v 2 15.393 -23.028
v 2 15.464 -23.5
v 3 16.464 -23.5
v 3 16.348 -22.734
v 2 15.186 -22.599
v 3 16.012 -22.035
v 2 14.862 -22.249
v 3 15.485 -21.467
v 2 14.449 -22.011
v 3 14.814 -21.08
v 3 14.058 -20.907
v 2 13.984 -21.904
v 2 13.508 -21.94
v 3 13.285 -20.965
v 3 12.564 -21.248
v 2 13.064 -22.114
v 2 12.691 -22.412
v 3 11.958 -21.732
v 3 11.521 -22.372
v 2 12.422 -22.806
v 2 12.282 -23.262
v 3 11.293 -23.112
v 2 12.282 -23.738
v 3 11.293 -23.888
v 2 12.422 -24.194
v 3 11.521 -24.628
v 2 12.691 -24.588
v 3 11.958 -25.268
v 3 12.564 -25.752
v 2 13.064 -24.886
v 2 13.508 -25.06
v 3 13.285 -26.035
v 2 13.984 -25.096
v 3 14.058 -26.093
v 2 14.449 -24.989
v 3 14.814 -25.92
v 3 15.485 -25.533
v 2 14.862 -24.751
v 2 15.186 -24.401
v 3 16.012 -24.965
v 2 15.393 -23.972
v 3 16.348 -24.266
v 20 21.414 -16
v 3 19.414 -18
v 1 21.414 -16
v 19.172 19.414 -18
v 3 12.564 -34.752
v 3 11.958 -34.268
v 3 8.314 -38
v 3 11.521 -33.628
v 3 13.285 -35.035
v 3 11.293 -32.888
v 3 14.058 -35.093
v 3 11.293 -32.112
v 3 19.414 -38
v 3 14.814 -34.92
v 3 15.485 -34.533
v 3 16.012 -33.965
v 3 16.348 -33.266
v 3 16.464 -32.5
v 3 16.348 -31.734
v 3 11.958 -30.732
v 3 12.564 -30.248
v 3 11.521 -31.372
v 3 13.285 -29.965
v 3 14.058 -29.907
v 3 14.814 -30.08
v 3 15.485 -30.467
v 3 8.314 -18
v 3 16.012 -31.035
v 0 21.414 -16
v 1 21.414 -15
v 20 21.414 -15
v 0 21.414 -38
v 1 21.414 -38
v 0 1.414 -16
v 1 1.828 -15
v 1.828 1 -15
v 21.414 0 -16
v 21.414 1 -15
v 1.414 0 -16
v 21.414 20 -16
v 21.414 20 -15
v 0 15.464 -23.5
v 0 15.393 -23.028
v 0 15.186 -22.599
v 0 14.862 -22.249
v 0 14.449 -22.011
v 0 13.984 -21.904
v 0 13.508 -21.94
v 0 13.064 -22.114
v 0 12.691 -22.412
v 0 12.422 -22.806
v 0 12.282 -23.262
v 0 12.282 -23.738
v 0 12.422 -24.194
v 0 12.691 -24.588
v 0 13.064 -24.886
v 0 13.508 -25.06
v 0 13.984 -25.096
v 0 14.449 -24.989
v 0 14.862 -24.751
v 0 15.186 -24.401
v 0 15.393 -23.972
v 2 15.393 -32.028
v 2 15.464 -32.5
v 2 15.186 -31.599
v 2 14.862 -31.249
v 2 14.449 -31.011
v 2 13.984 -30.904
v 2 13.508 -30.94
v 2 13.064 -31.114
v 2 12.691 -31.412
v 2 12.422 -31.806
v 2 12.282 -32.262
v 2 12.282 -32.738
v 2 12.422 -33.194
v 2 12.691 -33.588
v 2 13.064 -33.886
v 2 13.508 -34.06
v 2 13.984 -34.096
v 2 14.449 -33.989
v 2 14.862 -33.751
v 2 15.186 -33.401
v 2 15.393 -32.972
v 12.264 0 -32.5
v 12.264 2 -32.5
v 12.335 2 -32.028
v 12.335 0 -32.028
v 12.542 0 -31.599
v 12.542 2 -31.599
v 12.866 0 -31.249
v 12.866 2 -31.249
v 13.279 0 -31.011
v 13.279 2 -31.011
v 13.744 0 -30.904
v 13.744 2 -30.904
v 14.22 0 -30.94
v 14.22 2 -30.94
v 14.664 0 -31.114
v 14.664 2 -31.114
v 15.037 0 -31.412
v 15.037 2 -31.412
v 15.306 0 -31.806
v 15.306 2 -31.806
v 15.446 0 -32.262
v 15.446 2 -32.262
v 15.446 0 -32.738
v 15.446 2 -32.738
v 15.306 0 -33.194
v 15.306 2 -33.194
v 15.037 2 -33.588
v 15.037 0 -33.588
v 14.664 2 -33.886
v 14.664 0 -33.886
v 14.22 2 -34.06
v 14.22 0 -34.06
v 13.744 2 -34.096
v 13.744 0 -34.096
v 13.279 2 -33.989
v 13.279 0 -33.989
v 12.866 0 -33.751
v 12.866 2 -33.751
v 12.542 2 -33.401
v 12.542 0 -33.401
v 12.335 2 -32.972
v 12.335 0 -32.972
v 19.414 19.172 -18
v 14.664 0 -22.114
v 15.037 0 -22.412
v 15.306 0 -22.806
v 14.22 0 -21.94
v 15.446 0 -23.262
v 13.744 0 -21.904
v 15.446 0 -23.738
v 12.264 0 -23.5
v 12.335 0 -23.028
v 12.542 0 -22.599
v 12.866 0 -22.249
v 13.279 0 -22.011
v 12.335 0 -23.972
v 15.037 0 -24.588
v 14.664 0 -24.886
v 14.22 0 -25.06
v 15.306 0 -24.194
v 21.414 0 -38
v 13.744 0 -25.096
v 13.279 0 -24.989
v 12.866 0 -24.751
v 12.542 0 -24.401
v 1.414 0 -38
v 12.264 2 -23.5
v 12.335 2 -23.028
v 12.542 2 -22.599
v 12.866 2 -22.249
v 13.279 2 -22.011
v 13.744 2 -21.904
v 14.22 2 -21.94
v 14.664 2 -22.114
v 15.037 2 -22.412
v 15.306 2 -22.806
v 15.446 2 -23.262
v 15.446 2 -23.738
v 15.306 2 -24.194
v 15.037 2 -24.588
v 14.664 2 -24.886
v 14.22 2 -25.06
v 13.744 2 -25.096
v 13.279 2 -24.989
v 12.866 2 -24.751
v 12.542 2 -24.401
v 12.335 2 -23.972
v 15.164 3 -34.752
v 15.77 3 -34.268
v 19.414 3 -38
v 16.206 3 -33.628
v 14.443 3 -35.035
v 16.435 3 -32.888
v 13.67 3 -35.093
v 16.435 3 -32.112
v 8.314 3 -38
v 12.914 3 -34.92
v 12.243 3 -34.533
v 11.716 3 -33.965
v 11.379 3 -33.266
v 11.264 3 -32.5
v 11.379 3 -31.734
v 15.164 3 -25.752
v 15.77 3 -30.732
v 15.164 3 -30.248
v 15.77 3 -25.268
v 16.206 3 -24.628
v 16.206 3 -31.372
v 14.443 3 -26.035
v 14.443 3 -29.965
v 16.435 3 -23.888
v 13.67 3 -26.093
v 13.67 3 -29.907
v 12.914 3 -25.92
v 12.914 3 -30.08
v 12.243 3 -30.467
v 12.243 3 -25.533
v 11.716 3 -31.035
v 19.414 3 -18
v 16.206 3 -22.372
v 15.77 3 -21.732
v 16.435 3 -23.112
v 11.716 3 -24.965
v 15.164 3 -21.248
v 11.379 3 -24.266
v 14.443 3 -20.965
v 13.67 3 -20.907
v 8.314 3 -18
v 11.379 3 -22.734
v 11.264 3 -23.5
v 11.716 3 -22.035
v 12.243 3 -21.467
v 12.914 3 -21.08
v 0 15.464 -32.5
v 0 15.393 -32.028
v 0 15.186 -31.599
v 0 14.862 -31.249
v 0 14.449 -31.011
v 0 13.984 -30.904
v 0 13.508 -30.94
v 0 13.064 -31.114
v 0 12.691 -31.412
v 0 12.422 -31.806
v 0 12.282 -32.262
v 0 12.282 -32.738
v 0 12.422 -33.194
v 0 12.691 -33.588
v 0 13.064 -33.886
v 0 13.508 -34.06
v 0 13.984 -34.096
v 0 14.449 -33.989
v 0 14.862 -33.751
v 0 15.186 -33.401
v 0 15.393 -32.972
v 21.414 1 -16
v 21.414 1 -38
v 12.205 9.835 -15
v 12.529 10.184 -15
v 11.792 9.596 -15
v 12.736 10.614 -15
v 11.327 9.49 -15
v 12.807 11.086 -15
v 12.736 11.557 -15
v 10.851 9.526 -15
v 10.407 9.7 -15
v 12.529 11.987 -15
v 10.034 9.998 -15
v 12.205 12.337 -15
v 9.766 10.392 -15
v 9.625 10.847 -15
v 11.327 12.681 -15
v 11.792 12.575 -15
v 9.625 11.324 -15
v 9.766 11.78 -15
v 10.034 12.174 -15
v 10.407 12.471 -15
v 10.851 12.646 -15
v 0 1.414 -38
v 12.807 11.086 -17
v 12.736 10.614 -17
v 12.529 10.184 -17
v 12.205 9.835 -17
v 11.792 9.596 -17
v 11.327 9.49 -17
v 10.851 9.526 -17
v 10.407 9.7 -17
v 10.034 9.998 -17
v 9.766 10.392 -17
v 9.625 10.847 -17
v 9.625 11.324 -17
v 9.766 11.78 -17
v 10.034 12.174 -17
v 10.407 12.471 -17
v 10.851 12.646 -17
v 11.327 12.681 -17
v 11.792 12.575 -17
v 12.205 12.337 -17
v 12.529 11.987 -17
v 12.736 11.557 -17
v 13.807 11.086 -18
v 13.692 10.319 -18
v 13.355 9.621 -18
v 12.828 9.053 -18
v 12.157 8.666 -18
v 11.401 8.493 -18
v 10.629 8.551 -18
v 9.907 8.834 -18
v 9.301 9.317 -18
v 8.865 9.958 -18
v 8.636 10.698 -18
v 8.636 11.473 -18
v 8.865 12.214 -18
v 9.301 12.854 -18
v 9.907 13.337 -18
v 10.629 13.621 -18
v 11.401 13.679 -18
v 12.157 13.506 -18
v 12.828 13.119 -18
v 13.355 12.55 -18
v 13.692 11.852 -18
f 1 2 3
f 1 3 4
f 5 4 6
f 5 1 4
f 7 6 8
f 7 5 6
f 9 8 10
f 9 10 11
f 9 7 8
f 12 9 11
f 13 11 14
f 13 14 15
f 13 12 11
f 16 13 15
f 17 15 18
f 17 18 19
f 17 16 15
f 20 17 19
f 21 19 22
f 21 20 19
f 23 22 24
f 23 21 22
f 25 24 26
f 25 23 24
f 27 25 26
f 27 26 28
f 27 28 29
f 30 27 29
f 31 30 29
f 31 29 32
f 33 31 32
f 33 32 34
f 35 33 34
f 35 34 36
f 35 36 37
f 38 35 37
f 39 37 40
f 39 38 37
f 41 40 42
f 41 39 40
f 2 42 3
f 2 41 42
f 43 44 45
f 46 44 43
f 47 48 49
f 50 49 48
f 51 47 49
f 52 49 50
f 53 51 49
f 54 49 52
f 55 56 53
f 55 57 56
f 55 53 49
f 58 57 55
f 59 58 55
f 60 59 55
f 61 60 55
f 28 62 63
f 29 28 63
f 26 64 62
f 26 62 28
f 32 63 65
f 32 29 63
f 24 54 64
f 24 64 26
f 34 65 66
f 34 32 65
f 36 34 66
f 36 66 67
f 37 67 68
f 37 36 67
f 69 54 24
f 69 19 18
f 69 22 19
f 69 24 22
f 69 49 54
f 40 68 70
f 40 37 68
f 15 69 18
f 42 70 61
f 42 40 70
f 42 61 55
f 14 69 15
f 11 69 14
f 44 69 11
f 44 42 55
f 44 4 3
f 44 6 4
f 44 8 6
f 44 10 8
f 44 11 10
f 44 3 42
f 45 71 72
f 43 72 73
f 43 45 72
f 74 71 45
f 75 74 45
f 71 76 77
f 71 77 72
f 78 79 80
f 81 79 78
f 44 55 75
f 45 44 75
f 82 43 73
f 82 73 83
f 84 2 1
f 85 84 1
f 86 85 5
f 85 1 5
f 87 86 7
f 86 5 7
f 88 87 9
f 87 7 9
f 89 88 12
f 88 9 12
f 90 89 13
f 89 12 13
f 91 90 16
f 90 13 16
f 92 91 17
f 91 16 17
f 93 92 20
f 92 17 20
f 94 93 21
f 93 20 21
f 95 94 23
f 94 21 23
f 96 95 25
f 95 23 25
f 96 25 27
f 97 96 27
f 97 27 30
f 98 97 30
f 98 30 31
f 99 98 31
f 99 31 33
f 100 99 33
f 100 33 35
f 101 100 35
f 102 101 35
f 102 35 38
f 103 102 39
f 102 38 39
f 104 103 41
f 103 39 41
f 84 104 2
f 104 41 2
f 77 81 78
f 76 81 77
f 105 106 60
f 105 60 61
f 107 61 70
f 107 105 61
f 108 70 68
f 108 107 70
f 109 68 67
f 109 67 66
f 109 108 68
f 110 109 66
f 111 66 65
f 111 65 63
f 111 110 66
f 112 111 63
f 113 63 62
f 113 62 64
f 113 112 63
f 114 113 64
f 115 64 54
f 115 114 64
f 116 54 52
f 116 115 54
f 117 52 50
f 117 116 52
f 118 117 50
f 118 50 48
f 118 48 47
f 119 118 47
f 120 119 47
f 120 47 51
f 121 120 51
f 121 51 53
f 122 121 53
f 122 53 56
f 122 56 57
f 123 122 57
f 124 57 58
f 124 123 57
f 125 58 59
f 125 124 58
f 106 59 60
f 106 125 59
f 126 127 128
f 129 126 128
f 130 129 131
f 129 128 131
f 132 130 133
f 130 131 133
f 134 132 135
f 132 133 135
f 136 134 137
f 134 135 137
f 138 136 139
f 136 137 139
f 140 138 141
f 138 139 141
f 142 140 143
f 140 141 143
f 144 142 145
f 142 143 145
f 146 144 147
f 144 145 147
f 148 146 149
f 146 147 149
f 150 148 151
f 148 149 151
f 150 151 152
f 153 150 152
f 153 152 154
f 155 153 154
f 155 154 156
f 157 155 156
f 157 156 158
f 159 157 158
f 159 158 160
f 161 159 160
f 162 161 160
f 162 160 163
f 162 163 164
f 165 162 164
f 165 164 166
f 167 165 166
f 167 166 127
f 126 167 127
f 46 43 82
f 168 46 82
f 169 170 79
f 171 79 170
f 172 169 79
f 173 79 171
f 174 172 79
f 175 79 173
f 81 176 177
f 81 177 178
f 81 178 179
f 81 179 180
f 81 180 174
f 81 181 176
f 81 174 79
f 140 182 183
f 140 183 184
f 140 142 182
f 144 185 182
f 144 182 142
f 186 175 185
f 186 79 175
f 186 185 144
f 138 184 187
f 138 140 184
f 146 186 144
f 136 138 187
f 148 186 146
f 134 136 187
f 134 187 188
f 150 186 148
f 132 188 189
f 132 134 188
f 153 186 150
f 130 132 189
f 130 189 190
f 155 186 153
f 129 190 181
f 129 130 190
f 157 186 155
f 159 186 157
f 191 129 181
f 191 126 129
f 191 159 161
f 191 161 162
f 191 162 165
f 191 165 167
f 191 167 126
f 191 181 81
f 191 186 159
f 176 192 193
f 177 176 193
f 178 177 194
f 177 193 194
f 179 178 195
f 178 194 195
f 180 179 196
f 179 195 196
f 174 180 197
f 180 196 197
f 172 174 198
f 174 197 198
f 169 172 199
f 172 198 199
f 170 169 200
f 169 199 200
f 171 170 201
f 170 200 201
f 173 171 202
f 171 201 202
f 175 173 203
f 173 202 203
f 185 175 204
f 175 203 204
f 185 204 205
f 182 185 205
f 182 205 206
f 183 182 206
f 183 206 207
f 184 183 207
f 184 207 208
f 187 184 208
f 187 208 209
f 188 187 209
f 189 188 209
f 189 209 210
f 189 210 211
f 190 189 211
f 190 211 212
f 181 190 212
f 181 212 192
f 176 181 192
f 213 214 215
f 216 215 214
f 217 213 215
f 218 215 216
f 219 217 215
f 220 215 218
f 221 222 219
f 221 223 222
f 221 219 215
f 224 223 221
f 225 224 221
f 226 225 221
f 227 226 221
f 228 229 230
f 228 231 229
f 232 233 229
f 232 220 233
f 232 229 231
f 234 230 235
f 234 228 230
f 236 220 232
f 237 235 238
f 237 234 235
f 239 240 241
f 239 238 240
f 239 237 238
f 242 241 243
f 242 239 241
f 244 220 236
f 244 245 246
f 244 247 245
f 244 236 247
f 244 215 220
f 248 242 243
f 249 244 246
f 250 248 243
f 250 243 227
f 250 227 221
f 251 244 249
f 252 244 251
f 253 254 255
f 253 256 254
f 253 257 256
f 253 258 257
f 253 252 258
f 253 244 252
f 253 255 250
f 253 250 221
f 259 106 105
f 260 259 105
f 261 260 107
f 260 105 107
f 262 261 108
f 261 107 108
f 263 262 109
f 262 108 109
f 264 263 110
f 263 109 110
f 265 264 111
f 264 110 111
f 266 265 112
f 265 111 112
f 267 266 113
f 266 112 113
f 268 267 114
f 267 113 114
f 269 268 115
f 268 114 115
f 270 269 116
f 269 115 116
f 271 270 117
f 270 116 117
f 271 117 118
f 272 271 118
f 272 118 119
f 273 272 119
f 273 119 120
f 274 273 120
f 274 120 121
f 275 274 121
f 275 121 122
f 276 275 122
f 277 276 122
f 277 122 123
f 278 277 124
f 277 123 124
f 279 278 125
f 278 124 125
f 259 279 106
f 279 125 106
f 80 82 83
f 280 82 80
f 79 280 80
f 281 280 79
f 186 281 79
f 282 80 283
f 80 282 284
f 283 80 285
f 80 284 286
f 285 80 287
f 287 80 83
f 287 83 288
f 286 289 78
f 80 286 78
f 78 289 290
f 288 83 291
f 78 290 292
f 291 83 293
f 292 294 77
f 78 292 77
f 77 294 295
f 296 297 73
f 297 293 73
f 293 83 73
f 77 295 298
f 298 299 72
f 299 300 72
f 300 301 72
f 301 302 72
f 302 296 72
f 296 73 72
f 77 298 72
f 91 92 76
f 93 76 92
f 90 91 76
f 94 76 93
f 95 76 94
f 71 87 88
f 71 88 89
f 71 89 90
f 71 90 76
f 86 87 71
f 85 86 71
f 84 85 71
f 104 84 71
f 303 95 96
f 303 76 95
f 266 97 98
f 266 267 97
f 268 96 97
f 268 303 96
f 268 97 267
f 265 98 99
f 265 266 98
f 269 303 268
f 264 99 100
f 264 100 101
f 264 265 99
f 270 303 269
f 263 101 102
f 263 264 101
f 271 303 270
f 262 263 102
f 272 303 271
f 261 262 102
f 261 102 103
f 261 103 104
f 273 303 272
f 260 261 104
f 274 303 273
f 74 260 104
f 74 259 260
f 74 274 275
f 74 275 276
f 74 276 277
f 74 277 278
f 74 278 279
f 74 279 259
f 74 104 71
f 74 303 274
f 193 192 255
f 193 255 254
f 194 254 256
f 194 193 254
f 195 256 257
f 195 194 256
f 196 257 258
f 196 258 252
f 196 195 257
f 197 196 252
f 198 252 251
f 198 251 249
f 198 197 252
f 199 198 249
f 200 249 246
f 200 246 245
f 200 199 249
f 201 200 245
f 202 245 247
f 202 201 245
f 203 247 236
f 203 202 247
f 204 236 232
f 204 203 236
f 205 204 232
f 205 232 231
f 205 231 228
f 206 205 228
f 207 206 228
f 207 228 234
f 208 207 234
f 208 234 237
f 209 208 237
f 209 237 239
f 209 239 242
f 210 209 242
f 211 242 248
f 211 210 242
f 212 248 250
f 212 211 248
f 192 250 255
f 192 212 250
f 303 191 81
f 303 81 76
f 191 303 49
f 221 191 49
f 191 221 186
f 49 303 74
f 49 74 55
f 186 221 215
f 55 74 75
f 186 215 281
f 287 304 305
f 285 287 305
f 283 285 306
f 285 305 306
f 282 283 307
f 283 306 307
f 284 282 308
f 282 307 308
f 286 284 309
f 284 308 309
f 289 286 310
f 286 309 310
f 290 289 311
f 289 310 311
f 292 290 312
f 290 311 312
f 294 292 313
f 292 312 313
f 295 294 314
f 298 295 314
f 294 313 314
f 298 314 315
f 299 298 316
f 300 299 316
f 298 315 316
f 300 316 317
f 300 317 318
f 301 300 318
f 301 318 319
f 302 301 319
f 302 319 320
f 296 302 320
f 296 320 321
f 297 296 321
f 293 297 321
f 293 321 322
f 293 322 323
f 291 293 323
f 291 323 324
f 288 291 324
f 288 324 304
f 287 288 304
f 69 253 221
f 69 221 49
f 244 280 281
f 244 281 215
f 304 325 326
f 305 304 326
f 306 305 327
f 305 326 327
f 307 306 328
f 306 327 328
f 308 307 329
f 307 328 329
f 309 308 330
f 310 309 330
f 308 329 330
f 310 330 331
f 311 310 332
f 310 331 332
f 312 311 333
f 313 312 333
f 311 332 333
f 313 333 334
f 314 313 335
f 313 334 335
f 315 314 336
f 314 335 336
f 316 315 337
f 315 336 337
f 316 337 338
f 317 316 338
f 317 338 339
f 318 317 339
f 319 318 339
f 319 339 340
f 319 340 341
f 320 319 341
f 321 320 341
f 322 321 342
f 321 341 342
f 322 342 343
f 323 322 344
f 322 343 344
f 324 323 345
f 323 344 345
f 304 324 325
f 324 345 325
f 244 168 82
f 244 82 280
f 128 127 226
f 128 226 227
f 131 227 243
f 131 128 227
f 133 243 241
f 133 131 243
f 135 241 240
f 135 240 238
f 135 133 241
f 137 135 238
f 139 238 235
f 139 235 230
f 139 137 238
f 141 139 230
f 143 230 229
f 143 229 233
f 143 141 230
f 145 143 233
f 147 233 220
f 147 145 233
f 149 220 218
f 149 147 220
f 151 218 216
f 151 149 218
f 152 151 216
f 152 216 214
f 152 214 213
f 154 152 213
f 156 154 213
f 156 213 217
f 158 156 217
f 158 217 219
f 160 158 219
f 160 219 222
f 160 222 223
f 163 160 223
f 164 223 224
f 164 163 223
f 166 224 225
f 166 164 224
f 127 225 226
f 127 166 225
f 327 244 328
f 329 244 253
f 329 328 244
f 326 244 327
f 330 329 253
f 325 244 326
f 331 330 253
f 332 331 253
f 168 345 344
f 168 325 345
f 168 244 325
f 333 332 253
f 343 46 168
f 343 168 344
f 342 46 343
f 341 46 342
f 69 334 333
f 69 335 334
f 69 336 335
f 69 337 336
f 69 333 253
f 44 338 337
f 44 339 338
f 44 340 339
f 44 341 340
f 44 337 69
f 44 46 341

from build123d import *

# Parameters (mm, degrees)
PAD048_DEPTH    = 20
PAD049_DEPTH    = 3
CHAMFER030_SIZE = 2
CHAMFER031_SIZE = 1
SKETCH091_R     = 1.6
POCKET029_DEPTH = 5
CHAMFER032_SIZE = 1
SKETCH092_R     = 1.6
POCKET030_DEPTH = 3
CHAMFER033_SIZE = 1
SKETCH093_R     = 1.6
POCKET031_DEPTH = 3.001
CHAMFER034_SIZE = 1


with BuildPart() as part:
    # Sketch089 → Pad048 (new body)
    with BuildSketch(Plane.XY):
        Polygon((19.414214, 3), (8.313708, 3), (3, 8.313708), (3, 19.414214), (1, 21.414214), (0, 21.414214), (0, 1.414214), (1.414214, 0), (21.414214, 0), (21.414214, 1), align=None)
    extrude(amount=-PAD048_DEPTH)

    # Sketch090 → Pad049 (join)
    with BuildSketch(Plane.XY):
        Polygon((0, 21.414214), (20, 21.414214), (21.414214, 20), (21.414214, 0), (1.414214, 0), (0, 1.414214), align=None)
    extrude(amount=PAD049_DEPTH)

    # Chamfer030
    chamfer030_edges = [part.edges().sort_by_distance(p)[0] for p in [
        (21.414214, 10.5, 0),
        (20.707107, 20.707107, 0),
        (10.5, 21.414214, 0),
    ]]
    chamfer(chamfer030_edges, length=CHAMFER030_SIZE)

    # Chamfer031
    chamfer031_edges = [part.edges().sort_by_distance(p)[0] for p in [
        (0.707107, 0.707107, 3),
        (11.414214, 0, 3),
        (0, 11.414214, 3),
    ]]
    chamfer(chamfer031_edges, length=CHAMFER031_SIZE)

    # Sketch091 (on Face15 of Chamfer031) → Pocket029 (cut)
    with BuildSketch(Plane(origin=(0, 0, 0), x_dir=(1, 0, 0), z_dir=(0, 0, -1))):
        with Locations((11.207107, -11.085786)):
            Circle(SKETCH091_R)
    extrude(amount=-POCKET029_DEPTH, mode=Mode.SUBTRACT)

    # Chamfer032
    chamfer032_edges = [part.edges().sort_by_distance(p)[0] for p in [
        (9.607107, 11.085786, 0),
    ]]
    chamfer(chamfer032_edges, length=CHAMFER032_SIZE)

    # Sketch092 (on Face16 of Chamfer032) → Pocket030 (cut)
    with BuildSketch(Plane.YZ.offset(3)):
        with Locations((13.863961, -14.5)):
            Circle(SKETCH092_R)
        with Locations((13.863961, -5.5)):
            Circle(SKETCH092_R)
    extrude(amount=-POCKET030_DEPTH, mode=Mode.SUBTRACT)

    # Chamfer033
    chamfer033_edges = [part.edges().sort_by_distance(p)[0] for p in [
        (3, 12.263961, -14.5),
        (3, 12.263961, -5.5),
    ]]
    chamfer(chamfer033_edges, length=CHAMFER033_SIZE)

    # Sketch093 (on Face9 of Chamfer033) → Pocket031 (cut, through all)
    with BuildSketch(Plane(origin=(0, 3, 0), x_dir=(-1, 0, 0), z_dir=(0, 1, 0))):
        with Locations((-13.863961, -5.5)):
            Circle(SKETCH093_R)
        with Locations((-13.863961, -14.5)):
            Circle(SKETCH093_R)
    extrude(amount=-POCKET031_DEPTH, mode=Mode.SUBTRACT)

    # Chamfer034
    chamfer034_edges = [part.edges().sort_by_distance(p)[0] for p in [
        (15.463961, 3, -5.5),
        (15.463961, 3, -14.5),
    ]]
    chamfer(chamfer034_edges, length=CHAMFER034_SIZE)


with BuildPart() as part_1:
    # Body088 placement: moved
    add(part.part.moved(Location((0, 0, -18))))


solid = part_1.part
